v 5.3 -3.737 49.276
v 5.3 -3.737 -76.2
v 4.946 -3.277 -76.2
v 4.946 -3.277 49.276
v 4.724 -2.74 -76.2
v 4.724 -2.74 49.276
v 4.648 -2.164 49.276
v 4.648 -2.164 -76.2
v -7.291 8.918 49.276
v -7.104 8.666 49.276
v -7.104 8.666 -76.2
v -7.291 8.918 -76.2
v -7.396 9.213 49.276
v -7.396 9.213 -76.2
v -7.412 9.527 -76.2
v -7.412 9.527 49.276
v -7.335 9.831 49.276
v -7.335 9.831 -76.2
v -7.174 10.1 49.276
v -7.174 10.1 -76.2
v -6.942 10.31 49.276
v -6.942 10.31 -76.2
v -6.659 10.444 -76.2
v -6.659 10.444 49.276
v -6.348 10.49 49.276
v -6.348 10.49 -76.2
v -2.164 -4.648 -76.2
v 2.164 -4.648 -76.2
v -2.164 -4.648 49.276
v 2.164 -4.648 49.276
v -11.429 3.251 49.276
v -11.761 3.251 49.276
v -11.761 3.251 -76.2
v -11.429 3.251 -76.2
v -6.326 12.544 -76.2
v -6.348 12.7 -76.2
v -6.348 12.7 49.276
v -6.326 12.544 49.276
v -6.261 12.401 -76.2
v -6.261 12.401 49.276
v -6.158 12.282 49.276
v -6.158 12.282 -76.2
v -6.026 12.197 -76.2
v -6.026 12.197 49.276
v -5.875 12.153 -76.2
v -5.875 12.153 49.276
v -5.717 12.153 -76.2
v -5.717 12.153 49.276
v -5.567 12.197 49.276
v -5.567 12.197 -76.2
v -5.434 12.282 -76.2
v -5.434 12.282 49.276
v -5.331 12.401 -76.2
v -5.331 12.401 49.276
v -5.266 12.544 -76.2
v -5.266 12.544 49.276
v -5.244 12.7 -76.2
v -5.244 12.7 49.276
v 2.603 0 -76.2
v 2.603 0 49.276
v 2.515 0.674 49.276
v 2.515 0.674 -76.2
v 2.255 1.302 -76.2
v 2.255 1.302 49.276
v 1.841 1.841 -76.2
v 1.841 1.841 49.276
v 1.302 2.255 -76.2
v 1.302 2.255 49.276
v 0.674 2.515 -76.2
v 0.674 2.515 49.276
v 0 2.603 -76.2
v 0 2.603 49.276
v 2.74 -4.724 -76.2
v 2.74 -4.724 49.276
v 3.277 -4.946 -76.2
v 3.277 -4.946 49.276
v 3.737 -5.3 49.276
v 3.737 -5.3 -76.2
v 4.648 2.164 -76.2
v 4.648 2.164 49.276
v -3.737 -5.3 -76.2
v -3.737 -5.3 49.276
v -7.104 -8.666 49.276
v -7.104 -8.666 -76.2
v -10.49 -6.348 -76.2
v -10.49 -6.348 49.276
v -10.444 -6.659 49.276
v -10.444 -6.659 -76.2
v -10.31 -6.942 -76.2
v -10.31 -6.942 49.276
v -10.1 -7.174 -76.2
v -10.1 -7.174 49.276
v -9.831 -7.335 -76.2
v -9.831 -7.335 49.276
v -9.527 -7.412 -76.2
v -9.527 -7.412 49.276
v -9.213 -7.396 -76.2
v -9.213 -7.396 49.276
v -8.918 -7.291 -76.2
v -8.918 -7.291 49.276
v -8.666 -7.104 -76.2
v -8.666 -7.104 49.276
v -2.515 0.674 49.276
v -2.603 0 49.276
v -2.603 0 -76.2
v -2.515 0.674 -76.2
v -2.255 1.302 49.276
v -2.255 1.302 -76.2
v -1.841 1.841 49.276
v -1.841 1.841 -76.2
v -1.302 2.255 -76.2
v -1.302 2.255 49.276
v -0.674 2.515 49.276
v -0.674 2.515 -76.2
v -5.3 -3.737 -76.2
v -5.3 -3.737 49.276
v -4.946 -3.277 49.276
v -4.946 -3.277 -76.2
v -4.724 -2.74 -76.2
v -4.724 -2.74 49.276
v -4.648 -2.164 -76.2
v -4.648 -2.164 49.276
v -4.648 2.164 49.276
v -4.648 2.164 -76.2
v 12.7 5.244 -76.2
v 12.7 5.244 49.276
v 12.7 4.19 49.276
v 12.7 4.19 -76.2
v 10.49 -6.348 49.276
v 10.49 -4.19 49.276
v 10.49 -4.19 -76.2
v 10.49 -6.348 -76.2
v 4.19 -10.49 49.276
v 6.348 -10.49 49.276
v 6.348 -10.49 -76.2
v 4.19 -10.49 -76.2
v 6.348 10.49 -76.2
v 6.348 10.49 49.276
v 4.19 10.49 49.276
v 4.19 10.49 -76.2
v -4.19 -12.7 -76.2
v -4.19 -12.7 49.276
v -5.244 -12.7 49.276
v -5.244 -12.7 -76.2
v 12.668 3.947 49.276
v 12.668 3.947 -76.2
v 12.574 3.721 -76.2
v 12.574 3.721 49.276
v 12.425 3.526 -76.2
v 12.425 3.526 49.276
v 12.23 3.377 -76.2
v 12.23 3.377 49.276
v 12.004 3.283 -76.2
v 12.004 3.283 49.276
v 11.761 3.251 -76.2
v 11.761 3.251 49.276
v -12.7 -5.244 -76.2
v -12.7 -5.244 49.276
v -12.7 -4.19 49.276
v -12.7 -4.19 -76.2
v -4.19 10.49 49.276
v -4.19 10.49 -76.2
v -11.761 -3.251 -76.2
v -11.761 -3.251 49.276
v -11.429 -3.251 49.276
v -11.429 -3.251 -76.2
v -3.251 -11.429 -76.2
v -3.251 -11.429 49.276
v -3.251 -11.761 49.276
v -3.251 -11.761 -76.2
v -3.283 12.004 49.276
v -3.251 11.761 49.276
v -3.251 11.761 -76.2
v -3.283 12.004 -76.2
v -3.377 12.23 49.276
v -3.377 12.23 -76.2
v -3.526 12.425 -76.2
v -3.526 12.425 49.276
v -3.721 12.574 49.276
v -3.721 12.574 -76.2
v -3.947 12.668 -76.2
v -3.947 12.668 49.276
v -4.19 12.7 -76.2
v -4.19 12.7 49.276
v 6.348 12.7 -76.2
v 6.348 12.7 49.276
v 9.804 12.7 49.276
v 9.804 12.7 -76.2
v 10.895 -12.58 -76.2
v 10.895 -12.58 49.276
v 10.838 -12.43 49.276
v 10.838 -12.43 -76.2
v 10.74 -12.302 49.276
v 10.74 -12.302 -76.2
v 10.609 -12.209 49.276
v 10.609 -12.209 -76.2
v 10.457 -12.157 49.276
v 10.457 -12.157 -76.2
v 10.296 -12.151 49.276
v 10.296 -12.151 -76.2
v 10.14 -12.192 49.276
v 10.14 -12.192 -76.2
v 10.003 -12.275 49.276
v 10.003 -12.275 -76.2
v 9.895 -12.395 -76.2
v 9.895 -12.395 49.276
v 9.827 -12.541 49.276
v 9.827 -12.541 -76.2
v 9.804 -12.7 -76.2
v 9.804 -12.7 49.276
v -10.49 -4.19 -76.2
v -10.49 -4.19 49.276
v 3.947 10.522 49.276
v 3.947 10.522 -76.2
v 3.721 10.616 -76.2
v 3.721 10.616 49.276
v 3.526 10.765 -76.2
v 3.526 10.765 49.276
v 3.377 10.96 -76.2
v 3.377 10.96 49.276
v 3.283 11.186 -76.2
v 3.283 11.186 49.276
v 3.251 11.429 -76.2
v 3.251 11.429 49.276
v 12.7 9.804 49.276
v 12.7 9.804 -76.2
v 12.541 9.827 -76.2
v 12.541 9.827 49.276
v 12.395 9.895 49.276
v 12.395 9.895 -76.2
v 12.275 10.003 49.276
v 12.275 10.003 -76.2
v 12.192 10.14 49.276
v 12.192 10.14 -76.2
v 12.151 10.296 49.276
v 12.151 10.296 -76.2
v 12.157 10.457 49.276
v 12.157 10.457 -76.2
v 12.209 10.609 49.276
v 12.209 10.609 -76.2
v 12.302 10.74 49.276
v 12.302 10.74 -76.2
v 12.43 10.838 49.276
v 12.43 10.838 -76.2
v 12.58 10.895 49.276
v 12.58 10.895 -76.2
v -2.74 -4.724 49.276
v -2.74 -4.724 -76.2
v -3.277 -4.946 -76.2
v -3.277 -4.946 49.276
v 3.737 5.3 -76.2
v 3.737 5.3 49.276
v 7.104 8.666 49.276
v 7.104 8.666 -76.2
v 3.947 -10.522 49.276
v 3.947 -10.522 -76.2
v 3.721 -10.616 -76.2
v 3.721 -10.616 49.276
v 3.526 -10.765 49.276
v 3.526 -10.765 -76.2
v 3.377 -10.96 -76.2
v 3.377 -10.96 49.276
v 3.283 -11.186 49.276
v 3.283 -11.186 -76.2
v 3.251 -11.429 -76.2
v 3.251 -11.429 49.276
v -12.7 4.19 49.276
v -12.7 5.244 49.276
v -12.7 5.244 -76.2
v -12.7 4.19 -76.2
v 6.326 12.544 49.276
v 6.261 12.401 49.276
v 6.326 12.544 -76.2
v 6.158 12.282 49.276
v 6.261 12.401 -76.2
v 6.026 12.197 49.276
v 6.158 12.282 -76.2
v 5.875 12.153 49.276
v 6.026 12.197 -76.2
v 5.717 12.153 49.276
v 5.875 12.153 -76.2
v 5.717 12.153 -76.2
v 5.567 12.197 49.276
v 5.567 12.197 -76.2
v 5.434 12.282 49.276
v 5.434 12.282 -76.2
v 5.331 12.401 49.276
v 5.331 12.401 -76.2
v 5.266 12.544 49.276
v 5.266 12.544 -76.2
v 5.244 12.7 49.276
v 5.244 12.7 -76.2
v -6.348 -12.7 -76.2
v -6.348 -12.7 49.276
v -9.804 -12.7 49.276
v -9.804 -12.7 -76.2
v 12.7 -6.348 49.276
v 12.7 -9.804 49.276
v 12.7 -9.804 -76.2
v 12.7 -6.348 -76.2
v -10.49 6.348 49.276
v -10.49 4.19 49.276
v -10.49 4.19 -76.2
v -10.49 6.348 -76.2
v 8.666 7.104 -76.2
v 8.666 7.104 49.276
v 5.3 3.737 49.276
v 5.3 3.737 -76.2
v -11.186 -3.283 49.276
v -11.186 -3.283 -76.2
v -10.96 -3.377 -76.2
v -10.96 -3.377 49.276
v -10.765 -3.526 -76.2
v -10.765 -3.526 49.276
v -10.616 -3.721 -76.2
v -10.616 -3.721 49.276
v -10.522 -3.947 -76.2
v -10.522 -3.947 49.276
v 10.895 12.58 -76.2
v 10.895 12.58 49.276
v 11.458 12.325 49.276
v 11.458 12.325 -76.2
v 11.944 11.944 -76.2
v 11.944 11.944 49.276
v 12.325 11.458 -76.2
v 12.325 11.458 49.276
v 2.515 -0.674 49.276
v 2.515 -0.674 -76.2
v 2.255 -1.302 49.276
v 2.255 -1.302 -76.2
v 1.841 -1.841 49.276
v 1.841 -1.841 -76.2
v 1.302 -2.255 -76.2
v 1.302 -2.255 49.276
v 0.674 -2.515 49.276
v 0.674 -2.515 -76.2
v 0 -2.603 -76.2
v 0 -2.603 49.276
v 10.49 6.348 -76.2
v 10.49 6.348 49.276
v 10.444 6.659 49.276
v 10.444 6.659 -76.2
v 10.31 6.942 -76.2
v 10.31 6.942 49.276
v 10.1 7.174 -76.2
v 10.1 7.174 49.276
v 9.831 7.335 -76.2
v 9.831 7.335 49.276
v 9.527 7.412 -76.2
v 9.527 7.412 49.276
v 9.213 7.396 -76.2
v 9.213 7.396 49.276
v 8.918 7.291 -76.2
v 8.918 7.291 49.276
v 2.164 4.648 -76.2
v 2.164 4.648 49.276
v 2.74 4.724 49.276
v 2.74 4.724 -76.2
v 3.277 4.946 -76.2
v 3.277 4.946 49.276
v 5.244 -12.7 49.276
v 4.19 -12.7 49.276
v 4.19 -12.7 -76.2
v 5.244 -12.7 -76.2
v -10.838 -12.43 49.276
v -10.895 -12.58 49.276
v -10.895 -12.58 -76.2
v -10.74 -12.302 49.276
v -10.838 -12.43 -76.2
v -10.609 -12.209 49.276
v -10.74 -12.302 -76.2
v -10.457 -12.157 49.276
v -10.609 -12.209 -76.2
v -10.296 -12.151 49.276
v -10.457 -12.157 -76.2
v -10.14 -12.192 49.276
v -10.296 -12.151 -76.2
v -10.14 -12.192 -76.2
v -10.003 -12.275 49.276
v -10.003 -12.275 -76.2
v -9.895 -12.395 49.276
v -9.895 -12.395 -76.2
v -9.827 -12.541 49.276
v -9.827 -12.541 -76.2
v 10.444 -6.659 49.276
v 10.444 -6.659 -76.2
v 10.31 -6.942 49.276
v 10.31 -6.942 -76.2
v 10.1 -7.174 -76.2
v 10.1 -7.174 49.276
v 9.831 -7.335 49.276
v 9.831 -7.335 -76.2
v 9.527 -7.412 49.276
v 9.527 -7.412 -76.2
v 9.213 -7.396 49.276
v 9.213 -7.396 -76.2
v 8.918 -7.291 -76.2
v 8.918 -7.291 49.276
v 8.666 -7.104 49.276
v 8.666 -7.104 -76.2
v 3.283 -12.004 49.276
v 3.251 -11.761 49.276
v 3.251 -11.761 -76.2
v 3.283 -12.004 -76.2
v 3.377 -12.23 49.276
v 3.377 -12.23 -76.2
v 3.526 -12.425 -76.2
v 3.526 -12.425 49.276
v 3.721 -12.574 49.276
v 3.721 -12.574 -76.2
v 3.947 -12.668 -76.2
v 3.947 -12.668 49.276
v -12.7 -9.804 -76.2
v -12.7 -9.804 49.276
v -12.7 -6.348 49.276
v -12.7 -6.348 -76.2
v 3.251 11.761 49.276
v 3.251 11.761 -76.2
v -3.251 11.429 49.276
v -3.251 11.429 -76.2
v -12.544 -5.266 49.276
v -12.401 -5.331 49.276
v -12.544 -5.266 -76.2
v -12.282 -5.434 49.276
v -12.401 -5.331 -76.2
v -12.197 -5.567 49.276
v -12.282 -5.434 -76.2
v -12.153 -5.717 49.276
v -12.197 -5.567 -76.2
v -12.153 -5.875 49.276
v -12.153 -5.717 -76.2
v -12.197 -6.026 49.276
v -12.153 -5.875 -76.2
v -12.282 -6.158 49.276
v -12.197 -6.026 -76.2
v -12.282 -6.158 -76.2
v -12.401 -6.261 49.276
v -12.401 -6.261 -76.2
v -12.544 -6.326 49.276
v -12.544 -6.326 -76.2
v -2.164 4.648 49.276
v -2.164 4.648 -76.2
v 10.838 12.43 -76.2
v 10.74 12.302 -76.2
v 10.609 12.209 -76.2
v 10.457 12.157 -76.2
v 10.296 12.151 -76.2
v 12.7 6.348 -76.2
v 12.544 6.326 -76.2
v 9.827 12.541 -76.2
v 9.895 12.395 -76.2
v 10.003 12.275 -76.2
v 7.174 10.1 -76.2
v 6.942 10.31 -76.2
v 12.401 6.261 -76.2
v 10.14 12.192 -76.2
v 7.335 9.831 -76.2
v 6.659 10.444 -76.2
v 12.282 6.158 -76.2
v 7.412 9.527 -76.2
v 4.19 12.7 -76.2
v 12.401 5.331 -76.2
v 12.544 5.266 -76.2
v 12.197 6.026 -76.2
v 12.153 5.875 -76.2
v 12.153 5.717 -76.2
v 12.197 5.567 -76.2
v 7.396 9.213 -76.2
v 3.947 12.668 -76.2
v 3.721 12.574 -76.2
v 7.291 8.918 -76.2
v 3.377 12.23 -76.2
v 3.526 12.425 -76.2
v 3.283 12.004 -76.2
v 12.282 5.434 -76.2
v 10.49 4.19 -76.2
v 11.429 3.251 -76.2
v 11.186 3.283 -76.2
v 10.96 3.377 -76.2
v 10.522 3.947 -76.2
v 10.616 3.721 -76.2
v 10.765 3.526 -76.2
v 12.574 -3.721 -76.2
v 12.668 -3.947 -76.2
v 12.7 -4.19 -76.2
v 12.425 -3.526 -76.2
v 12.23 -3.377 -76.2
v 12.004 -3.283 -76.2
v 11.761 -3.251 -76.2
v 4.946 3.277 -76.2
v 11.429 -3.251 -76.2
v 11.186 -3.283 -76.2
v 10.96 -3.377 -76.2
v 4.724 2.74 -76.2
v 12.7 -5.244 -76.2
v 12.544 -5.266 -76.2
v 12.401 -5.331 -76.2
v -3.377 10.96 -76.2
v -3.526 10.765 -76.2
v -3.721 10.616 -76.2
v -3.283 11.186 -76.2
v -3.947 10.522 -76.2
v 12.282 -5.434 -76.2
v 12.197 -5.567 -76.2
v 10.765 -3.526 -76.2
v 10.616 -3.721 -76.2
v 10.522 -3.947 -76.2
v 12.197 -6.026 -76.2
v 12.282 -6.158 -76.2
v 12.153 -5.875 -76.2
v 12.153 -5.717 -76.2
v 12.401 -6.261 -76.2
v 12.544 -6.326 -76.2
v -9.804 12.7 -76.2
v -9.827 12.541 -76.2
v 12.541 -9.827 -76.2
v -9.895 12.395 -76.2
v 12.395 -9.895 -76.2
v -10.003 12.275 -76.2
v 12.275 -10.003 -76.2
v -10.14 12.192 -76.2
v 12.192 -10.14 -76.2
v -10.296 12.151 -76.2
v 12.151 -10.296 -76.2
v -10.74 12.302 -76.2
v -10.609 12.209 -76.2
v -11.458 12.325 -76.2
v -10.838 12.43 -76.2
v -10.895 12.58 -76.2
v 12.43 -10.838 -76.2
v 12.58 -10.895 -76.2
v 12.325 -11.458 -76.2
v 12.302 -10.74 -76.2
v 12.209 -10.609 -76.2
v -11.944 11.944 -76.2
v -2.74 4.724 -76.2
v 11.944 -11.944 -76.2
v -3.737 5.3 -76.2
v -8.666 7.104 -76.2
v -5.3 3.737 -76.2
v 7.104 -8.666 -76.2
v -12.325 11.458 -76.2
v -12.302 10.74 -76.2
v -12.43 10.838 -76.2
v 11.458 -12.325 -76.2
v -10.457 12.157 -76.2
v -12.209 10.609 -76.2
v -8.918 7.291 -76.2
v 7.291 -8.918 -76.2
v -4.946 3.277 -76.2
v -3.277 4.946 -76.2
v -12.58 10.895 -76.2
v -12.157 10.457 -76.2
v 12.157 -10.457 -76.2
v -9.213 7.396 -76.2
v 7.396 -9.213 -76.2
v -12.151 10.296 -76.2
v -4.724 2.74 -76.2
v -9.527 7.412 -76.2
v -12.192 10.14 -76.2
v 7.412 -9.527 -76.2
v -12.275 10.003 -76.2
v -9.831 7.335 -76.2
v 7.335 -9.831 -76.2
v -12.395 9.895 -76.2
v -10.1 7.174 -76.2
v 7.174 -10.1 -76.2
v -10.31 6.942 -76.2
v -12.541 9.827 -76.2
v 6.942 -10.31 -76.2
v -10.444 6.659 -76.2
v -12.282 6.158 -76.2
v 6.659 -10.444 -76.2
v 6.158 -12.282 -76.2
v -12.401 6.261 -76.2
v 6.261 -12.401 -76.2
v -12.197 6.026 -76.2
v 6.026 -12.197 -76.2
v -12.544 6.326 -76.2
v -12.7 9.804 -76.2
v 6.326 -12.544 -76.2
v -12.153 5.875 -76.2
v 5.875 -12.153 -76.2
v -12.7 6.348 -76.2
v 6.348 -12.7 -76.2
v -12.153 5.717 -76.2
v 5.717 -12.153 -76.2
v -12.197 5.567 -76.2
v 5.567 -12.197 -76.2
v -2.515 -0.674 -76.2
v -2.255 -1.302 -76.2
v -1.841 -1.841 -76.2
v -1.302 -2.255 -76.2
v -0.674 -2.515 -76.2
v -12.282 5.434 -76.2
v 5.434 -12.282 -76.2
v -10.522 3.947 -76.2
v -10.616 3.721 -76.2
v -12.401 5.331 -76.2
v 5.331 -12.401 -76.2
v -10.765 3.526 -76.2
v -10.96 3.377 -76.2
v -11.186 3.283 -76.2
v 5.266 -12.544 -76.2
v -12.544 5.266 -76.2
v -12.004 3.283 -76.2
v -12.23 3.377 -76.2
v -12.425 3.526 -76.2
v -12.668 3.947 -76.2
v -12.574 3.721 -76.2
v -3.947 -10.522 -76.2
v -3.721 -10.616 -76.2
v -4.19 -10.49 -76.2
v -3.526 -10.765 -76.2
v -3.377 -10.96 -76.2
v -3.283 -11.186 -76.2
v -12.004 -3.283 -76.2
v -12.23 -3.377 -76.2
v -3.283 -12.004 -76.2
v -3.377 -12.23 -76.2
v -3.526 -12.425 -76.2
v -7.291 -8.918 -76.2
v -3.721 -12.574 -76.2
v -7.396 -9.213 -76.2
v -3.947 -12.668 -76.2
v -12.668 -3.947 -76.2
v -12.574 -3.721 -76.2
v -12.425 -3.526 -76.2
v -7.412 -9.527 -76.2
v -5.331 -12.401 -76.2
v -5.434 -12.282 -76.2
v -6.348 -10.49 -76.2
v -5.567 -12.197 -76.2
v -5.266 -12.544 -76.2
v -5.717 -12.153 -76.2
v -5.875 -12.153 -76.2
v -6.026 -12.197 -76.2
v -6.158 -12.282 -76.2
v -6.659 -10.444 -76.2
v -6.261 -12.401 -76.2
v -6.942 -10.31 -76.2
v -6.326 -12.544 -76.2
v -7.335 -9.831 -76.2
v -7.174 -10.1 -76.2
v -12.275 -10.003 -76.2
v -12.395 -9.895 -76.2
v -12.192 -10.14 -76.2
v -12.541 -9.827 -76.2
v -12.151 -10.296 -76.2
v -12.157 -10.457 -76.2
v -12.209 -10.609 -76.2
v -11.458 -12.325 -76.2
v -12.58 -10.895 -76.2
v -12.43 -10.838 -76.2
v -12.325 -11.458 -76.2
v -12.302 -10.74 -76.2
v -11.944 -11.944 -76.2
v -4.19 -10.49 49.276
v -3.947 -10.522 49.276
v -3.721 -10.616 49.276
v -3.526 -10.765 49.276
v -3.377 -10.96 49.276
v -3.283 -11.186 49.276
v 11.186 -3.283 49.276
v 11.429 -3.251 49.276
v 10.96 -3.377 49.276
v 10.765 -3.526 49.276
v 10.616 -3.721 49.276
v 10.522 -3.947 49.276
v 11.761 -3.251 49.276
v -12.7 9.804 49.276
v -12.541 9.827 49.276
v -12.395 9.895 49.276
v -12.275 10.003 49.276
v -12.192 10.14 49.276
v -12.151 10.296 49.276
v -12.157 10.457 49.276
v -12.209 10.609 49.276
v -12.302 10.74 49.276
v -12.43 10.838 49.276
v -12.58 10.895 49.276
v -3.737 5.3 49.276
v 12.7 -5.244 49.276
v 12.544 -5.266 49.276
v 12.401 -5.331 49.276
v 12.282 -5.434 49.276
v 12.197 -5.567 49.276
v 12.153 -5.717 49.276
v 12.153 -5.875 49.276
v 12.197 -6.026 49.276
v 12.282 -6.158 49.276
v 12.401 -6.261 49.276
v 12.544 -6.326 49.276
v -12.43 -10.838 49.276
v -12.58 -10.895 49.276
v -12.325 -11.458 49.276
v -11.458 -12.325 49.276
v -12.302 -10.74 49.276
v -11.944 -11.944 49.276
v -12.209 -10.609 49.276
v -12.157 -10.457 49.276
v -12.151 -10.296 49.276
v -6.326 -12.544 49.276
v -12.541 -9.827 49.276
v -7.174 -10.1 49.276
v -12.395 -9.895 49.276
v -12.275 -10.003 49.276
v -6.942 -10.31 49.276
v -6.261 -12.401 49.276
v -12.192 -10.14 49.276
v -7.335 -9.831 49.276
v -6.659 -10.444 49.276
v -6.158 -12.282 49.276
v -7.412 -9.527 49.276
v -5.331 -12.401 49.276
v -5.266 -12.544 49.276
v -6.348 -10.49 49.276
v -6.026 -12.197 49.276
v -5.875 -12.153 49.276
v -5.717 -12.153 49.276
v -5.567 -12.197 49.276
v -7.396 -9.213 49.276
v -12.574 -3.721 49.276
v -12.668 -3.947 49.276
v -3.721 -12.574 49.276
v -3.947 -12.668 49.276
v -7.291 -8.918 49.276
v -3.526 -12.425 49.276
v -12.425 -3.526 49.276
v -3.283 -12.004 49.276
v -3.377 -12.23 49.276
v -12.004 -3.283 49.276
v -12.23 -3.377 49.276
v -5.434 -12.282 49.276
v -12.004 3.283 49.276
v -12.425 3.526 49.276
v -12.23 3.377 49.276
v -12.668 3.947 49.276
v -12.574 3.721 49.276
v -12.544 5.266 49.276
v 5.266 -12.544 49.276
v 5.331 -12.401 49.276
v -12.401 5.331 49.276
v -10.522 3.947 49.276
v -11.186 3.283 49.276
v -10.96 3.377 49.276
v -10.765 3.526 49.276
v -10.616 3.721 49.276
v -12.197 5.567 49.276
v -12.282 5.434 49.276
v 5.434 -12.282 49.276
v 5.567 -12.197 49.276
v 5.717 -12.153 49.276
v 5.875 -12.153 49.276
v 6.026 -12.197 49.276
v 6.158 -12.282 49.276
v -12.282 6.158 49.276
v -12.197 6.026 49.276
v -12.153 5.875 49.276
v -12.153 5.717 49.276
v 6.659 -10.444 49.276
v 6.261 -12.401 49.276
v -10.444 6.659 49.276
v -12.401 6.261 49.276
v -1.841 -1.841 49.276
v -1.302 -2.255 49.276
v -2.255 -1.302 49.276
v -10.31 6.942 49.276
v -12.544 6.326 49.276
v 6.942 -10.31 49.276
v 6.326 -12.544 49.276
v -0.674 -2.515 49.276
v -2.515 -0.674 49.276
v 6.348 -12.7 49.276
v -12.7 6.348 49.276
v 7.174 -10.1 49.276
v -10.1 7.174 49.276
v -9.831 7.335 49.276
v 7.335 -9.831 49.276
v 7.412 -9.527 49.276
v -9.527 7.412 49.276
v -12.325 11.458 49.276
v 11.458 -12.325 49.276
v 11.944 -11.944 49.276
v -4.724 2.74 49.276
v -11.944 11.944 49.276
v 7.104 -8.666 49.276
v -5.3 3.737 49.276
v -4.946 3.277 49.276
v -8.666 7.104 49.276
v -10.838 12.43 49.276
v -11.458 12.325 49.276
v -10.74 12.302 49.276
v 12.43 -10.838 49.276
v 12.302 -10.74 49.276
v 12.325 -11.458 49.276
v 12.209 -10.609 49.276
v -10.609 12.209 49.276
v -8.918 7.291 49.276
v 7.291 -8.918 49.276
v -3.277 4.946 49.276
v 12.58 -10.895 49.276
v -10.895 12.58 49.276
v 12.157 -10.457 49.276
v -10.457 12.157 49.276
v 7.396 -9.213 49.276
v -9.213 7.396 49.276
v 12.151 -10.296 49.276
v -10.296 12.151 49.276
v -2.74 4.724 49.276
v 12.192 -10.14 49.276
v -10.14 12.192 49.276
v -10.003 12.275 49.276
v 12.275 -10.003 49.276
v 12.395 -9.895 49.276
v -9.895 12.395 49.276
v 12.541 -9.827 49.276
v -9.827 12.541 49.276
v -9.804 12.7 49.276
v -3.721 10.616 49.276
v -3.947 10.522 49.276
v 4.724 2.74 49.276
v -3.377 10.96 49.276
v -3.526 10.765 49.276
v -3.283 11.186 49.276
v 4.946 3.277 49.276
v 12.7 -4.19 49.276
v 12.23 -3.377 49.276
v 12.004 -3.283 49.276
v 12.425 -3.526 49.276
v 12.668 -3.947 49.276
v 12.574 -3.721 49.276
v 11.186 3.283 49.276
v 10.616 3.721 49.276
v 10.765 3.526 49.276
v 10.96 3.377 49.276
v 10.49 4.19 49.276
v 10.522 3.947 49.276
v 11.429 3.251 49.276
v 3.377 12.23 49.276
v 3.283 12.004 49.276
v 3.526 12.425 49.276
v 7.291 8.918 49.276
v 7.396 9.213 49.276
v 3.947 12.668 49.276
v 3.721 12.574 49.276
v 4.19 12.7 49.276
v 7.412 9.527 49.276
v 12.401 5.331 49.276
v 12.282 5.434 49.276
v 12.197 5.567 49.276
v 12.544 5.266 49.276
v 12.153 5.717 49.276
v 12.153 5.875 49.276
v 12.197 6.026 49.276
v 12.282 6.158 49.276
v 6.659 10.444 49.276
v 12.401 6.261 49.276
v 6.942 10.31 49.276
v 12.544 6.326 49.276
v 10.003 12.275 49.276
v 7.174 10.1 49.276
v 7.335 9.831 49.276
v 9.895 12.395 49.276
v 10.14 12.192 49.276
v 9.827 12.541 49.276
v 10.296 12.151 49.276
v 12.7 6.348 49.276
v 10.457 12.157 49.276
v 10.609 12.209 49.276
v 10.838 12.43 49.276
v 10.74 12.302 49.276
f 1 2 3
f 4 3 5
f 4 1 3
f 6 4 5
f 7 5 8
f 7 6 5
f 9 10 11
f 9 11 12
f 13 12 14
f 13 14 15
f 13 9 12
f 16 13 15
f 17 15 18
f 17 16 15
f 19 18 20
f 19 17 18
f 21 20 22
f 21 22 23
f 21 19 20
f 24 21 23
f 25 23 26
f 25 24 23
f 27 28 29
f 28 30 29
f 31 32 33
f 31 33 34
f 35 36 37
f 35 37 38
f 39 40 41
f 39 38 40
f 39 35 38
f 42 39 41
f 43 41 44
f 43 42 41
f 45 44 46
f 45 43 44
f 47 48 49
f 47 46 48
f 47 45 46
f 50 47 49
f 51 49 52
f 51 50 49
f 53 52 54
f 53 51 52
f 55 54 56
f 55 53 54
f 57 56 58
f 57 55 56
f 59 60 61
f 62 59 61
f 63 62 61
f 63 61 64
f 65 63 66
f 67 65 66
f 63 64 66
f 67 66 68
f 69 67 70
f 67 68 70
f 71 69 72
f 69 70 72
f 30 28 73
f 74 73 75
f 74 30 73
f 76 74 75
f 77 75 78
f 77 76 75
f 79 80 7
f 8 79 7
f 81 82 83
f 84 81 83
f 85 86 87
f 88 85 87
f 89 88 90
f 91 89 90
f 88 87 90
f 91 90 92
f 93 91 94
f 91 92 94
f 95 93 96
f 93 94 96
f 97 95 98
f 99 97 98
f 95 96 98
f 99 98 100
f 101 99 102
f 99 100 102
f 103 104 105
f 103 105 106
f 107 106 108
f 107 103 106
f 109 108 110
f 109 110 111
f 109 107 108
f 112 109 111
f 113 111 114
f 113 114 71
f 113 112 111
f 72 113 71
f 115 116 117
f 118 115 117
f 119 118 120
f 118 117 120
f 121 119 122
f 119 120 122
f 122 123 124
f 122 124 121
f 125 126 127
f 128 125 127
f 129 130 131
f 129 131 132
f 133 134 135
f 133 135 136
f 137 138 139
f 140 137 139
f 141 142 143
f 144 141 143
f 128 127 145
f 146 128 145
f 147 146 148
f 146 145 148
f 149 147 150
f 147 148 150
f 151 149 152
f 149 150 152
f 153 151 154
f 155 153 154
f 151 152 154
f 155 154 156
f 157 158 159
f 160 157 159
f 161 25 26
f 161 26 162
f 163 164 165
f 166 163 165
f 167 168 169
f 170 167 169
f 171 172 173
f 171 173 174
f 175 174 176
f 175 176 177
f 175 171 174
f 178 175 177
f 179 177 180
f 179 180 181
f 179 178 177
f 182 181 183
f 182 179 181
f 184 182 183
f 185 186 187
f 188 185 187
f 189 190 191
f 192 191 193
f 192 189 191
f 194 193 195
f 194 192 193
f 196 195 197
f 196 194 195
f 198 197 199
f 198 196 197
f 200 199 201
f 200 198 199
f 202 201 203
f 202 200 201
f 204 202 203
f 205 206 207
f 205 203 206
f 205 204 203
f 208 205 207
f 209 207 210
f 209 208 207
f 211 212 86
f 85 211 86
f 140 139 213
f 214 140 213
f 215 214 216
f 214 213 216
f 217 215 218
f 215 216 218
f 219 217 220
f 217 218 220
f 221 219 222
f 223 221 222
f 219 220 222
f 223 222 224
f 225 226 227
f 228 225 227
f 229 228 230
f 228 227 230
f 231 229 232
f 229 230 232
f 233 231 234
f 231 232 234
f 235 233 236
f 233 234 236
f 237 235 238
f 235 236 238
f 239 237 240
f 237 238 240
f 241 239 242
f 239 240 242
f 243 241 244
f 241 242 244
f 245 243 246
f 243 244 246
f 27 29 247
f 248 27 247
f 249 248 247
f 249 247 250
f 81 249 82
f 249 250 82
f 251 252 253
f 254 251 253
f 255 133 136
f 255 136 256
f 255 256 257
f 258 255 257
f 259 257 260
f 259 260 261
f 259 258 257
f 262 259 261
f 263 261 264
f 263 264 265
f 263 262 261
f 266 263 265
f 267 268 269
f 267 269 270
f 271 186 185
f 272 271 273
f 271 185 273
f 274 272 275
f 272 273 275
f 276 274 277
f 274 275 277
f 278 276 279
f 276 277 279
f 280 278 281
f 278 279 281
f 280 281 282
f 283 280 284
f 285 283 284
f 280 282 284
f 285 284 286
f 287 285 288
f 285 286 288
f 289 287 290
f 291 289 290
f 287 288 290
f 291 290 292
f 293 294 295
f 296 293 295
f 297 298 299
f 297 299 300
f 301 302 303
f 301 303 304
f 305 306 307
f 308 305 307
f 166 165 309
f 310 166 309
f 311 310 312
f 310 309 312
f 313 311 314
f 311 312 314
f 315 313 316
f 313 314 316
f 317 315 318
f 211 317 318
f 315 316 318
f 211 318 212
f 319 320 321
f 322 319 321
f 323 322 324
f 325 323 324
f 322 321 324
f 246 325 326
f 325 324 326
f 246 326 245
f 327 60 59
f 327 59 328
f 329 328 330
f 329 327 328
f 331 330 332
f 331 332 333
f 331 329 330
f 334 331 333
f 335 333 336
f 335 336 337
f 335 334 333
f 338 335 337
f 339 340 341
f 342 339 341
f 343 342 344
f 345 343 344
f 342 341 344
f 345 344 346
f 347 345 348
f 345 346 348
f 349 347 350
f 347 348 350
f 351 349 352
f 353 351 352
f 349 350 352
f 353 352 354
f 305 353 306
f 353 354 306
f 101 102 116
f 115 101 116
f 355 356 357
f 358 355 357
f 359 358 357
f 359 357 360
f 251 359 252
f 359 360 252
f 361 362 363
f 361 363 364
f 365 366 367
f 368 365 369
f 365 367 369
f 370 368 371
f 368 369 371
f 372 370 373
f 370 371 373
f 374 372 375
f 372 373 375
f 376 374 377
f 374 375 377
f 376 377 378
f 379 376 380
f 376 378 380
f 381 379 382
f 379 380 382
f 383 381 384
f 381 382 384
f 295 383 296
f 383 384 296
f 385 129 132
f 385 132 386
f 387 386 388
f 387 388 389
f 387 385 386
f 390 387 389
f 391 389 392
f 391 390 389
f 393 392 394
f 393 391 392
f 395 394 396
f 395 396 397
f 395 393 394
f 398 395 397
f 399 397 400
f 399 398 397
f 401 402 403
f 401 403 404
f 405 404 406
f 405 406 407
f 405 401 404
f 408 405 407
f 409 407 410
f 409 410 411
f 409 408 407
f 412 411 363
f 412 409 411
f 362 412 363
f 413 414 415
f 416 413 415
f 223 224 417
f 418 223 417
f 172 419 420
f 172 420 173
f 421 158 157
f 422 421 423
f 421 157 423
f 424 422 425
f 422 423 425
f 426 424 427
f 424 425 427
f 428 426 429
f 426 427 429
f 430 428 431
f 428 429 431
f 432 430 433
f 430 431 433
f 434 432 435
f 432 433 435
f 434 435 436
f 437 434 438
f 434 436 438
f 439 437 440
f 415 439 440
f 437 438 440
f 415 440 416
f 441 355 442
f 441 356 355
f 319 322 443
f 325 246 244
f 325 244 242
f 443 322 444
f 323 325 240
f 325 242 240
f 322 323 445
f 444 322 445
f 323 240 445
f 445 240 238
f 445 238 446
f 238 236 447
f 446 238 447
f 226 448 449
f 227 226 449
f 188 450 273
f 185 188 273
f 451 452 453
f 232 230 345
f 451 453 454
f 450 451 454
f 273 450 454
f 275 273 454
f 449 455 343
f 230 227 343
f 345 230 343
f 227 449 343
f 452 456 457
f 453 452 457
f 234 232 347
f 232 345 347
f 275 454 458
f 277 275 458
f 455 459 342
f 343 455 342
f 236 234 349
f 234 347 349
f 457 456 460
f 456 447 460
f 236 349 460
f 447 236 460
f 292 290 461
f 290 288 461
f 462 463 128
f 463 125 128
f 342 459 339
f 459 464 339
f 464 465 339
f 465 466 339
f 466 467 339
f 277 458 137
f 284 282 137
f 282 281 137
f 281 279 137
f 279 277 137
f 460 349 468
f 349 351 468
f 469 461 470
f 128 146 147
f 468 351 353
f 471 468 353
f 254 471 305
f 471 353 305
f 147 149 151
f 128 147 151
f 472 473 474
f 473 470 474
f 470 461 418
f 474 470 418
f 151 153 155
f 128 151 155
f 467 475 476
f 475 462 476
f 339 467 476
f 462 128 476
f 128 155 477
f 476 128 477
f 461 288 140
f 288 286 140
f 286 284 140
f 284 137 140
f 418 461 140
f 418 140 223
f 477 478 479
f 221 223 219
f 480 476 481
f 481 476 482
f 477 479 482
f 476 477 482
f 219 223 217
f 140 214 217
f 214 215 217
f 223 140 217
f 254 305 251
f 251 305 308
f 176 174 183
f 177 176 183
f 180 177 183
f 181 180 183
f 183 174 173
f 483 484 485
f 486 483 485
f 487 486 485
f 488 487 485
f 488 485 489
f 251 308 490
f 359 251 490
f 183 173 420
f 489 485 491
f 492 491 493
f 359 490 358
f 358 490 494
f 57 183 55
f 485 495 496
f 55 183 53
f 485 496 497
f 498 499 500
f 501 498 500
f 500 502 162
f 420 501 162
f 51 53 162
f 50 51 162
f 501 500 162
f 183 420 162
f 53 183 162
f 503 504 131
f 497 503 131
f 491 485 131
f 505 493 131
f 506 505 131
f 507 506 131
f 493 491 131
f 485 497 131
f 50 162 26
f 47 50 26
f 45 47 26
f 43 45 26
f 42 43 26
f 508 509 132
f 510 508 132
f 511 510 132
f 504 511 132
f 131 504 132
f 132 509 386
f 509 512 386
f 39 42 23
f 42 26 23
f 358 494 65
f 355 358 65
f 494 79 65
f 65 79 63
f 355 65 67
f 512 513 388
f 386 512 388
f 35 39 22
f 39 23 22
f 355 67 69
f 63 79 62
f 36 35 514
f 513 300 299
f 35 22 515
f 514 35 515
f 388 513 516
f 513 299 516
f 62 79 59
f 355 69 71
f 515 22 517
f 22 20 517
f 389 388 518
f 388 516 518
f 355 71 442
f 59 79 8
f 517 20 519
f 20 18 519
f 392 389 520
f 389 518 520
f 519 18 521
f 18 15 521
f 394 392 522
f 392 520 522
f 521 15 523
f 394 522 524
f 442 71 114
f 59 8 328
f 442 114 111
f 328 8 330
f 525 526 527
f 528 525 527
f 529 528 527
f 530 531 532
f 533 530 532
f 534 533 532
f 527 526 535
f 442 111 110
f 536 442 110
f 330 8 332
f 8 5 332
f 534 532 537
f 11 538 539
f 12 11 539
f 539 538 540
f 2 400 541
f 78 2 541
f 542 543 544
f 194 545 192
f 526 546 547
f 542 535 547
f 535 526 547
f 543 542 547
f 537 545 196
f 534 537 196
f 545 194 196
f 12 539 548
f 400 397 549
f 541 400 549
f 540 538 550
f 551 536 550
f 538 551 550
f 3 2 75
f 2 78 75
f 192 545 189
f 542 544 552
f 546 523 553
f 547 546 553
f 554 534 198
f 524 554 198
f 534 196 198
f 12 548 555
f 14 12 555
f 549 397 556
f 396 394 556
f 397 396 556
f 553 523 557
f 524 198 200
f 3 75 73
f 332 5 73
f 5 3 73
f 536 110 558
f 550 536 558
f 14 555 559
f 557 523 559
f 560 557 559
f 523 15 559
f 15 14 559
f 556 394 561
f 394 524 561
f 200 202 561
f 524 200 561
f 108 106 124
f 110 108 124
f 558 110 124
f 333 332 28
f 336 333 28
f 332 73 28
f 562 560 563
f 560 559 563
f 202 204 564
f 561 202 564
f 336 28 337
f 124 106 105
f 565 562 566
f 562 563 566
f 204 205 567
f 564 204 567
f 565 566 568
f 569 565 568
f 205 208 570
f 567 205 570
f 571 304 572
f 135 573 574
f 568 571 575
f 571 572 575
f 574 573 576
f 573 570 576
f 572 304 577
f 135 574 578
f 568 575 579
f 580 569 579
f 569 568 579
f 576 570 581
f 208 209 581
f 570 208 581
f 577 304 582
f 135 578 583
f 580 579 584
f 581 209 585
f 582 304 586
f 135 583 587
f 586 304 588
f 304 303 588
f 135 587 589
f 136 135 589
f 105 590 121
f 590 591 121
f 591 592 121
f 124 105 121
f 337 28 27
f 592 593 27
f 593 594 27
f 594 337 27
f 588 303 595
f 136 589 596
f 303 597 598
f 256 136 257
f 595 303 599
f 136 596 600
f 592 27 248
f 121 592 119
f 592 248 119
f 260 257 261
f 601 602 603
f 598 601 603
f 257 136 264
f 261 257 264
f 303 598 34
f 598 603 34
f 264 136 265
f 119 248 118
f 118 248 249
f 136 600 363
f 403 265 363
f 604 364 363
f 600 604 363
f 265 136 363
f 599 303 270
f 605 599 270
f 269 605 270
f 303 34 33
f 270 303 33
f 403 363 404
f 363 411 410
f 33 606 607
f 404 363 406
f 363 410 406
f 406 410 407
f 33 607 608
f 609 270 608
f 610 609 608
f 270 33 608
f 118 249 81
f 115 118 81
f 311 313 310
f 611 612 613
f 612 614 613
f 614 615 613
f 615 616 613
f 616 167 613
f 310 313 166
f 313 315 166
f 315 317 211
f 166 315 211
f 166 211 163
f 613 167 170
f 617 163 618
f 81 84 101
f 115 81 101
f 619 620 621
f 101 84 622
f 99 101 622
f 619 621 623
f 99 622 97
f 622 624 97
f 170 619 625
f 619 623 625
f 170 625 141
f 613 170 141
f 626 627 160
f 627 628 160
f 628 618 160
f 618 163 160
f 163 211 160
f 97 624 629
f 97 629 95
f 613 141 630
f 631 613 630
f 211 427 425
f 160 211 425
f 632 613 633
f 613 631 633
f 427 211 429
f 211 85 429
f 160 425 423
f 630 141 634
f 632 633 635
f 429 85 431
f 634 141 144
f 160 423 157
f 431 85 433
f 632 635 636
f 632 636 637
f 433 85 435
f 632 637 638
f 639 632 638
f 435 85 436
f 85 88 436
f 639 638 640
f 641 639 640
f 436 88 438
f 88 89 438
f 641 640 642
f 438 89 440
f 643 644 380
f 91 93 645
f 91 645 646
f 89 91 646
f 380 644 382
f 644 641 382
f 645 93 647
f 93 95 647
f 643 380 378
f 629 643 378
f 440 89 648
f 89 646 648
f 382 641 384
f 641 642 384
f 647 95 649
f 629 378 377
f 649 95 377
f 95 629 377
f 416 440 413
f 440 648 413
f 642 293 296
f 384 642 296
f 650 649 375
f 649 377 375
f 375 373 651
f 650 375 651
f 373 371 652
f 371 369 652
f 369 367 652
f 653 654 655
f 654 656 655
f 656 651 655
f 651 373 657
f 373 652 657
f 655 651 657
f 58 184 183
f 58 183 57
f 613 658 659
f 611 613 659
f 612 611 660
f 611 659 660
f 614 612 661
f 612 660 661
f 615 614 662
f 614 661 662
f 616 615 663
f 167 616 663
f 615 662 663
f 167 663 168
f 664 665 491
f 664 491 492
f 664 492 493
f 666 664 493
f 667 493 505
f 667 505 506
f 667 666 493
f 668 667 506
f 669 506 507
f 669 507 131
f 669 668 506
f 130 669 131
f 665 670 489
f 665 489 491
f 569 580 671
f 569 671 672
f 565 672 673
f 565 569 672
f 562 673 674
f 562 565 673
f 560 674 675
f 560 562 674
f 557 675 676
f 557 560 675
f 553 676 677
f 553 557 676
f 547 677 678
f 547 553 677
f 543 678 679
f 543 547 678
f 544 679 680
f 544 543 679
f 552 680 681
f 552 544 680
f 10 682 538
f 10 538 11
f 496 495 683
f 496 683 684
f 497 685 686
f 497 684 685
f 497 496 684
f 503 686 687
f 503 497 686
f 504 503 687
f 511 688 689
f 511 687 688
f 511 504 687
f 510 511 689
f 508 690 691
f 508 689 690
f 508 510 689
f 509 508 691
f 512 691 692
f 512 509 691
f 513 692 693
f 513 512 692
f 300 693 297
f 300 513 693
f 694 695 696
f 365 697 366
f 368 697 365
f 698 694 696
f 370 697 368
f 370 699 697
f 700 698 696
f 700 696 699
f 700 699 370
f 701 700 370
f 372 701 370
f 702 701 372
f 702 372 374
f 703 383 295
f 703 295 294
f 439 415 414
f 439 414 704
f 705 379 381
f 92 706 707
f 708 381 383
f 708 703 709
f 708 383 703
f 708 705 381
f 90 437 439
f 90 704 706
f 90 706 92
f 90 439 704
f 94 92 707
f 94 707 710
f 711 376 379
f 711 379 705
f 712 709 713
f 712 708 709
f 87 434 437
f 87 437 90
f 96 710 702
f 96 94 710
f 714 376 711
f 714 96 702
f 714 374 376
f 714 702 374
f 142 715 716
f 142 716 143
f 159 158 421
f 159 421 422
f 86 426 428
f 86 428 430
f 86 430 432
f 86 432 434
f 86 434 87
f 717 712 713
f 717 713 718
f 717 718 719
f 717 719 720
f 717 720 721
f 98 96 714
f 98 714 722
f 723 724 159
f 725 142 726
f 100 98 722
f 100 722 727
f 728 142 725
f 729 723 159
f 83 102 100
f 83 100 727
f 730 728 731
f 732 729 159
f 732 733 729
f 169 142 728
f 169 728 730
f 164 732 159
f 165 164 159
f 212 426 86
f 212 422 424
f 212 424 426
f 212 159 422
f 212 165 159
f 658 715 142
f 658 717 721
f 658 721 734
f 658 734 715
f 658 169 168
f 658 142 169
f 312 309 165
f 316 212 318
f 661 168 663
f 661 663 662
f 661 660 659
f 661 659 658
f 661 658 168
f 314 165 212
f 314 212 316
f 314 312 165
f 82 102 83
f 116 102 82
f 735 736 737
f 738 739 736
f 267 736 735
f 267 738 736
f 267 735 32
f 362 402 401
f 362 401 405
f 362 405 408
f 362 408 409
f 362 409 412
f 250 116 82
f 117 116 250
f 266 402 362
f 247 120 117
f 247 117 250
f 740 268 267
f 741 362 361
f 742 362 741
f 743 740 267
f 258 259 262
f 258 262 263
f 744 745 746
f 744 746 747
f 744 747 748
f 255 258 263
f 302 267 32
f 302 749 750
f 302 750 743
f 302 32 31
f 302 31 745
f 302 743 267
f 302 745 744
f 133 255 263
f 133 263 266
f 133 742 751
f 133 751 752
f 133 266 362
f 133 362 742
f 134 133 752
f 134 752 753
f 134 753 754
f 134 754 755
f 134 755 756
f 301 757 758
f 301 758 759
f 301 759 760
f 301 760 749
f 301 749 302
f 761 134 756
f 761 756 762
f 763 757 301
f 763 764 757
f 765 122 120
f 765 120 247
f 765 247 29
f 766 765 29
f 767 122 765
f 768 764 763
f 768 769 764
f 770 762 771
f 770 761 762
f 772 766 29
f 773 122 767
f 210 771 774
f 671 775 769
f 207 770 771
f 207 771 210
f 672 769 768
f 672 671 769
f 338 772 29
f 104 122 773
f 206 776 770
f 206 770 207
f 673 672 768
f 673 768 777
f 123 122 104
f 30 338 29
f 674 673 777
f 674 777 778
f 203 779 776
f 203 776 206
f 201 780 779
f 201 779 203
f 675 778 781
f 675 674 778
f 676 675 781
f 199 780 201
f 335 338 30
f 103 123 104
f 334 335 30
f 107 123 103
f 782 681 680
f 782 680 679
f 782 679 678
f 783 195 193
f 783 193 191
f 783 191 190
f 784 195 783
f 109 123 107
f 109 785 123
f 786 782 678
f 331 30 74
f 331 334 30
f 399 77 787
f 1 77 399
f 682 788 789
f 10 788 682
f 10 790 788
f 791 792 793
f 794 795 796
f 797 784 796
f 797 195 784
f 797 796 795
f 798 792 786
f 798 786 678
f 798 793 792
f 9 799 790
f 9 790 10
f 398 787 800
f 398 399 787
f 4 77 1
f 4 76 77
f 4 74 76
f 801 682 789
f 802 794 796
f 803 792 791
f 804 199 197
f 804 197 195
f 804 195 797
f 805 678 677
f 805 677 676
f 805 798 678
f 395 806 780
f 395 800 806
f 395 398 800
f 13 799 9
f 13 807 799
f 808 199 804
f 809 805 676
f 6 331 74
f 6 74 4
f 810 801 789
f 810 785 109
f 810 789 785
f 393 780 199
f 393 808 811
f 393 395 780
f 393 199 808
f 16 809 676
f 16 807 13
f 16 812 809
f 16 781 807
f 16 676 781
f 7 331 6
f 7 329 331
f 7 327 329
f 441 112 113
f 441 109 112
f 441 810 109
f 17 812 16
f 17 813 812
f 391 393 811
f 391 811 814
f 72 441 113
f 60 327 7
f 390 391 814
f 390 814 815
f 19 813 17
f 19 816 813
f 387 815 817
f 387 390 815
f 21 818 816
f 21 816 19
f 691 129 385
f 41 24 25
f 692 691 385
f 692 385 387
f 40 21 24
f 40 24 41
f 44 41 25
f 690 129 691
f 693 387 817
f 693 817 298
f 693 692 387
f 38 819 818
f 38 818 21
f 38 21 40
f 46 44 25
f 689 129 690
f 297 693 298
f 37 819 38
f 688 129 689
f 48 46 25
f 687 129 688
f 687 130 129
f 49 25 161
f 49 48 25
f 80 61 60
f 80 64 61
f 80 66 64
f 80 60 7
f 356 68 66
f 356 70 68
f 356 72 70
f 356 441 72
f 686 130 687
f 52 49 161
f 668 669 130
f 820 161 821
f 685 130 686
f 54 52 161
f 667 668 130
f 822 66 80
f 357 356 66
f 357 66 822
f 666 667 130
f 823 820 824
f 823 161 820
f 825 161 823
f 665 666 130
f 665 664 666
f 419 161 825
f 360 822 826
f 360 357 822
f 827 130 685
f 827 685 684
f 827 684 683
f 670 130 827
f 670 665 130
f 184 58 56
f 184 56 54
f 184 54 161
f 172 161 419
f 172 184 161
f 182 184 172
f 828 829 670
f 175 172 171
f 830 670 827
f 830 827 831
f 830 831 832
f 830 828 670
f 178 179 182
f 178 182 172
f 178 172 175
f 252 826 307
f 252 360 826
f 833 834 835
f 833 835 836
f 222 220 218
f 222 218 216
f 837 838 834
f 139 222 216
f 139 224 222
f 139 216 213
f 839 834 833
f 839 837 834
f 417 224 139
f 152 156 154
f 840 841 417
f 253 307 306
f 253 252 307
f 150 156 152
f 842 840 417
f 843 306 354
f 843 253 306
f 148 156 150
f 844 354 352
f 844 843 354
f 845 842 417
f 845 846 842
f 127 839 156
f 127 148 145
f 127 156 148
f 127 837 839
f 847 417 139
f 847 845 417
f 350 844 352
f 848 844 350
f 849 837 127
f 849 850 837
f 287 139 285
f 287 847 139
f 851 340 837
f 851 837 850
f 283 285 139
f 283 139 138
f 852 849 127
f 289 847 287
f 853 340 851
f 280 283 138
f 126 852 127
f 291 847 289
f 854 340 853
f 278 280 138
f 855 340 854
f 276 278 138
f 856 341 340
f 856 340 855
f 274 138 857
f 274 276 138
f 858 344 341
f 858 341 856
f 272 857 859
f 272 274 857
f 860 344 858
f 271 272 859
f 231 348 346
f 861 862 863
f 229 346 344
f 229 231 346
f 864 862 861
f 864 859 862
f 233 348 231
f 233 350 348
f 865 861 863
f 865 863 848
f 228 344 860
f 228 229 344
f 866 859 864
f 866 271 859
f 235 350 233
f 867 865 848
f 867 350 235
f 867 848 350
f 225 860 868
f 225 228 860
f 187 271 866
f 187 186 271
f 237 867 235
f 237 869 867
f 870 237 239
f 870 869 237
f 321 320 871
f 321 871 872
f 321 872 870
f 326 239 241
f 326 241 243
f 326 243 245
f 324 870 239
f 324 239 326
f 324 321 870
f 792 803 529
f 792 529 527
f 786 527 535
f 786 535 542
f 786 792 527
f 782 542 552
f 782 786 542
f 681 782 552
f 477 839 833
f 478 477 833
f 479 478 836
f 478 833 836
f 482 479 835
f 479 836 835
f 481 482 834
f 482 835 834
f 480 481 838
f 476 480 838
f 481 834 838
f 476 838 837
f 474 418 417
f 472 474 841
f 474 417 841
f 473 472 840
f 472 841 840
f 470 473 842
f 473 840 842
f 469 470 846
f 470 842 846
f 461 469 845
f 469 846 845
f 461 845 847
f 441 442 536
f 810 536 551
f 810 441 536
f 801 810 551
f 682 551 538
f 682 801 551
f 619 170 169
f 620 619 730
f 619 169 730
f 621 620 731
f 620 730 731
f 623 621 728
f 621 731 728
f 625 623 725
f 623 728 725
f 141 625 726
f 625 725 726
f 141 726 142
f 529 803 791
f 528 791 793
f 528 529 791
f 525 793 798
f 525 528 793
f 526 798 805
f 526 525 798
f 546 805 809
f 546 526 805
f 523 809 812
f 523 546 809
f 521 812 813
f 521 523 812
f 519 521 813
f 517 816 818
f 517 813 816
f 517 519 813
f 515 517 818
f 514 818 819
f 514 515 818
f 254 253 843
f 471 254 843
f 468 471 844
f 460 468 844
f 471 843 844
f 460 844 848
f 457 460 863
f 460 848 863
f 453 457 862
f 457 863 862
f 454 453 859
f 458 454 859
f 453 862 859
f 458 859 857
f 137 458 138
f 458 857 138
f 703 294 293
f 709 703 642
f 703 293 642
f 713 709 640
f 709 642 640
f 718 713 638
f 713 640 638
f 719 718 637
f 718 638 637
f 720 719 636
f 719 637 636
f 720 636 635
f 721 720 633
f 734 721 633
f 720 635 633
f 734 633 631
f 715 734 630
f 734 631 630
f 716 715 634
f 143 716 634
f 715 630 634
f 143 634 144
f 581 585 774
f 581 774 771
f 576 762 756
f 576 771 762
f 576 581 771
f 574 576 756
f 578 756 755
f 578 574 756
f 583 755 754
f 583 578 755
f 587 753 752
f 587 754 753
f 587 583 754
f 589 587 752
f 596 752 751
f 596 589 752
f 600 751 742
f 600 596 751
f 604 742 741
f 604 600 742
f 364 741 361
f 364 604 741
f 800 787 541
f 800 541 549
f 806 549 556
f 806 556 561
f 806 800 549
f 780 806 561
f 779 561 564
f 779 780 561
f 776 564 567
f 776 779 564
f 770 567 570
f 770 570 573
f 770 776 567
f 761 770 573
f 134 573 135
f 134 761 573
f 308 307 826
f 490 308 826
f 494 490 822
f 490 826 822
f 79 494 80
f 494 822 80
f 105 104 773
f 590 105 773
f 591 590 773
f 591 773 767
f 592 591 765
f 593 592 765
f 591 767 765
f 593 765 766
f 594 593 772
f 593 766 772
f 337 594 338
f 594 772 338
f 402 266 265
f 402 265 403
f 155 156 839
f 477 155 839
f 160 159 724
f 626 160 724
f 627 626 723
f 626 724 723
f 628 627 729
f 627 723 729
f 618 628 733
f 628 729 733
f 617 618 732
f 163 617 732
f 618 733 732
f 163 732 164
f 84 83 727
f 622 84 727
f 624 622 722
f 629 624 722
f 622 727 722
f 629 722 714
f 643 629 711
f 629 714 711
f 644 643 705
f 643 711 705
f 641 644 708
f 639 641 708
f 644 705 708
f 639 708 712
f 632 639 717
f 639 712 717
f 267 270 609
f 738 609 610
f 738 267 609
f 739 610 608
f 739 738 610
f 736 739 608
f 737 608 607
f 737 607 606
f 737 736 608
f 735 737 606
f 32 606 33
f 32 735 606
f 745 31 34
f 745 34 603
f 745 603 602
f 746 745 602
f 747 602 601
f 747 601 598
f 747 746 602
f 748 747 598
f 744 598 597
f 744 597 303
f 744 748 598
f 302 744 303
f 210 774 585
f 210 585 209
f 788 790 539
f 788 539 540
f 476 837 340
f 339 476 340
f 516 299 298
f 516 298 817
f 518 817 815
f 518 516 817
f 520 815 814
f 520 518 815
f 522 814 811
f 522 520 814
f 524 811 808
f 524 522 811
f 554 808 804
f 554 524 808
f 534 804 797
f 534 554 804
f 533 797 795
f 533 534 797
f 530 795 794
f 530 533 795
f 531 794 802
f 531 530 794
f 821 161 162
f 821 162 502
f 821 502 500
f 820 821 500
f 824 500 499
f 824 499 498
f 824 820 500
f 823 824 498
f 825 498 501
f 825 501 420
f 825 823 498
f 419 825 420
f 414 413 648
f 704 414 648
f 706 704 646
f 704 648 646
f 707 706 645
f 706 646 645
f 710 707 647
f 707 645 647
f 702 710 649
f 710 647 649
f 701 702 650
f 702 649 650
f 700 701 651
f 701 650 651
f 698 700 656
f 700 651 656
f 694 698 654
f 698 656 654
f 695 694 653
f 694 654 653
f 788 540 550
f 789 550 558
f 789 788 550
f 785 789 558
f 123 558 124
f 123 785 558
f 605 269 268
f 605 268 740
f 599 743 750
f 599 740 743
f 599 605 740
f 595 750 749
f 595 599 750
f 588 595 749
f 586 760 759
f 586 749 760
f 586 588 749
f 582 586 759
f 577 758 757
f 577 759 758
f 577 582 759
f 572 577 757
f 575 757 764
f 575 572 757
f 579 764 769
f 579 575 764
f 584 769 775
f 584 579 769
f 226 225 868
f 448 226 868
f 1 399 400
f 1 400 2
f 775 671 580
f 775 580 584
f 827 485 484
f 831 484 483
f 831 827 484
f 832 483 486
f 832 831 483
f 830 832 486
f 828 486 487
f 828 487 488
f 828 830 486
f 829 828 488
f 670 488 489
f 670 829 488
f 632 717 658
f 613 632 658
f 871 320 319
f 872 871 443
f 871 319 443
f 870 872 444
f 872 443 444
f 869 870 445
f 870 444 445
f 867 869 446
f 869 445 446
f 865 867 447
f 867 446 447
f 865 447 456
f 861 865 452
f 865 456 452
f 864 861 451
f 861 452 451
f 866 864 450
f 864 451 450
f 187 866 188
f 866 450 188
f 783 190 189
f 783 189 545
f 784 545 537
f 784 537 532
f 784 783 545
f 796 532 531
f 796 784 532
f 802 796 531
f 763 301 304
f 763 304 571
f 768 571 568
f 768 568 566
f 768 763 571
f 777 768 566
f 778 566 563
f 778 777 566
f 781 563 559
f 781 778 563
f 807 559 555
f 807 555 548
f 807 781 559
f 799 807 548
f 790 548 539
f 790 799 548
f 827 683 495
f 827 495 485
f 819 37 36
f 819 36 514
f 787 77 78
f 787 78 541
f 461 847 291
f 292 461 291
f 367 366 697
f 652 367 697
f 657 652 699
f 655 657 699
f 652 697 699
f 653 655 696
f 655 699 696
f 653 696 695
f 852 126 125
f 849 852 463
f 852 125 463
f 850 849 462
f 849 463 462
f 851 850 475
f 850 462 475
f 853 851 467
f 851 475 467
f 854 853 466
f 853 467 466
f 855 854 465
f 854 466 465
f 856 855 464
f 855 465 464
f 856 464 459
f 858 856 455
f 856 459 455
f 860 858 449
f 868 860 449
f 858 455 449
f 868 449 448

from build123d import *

# Parameters (mm, degrees)
BOSS_EXTRUDE1_DEPTH     = 76.2
CUT_EXTRUDE1_DEPTH      = 79.288057838
CUT_EXTRUDE1_DEPTH_BACK = 79.288057838
SKETCH5_R               = 0.55245
SKETCH6_W               = 30.48
SKETCH6_H               = 30.48
CUT_EXTRUDE2_DEPTH      = 26.924


with BuildPart() as part:
    # Sketch4 → Boss-Extrude1 (new, symmetric)
    with BuildSketch(Plane.XY):
        with BuildLine():
            Line((4.190365, -12.7), (10.11729625, -12.7))
            ThreePointArc((10.11729625, -12.7), (11.943543585, -11.943543585), (12.7, -10.11729625))
            Line((12.7, -10.11729625), (12.7, -4.190365))
            ThreePointArc((12.7, -4.190365), (12.42492494, -3.52627506), (11.760835, -3.2512))
            Line((11.760835, -3.2512), (11.429365, -3.2512))
            ThreePointArc((11.429365, -3.2512), (10.76527506, -3.52627506), (10.4902, -4.190365))
            Line((10.4902, -4.190365), (10.4902, -6.348478019))
            ThreePointArc((10.4902, -6.348478019), (9.830707141, -7.335478831), (8.666460301, -7.103895736))
            Line((8.666460301, -7.103895736), (5.299899128, -3.737334563))
            ThreePointArc((5.299899128, -3.737334563), (4.817571085, -3.015479634), (4.6482, -2.16399369))
            Line((4.6482, -2.16399369), (4.6482, 0))
            Line((4.6482, 0), (2.6035, 0))
            ThreePointArc((2.6035, 0), (1.840952505, -1.840952505), (0, -2.6035))
            Line((0, -2.6035), (0, -4.6482))
            Line((0, -4.6482), (2.16399369, -4.6482))
            ThreePointArc((2.16399369, -4.6482), (3.015479634, -4.817571085), (3.737334563, -5.299899128))
            Line((3.737334563, -5.299899128), (7.103895736, -8.666460301))
            ThreePointArc((7.103895736, -8.666460301), (7.335478831, -9.830707141), (6.348478019, -10.4902))
            Line((6.348478019, -10.4902), (4.190365, -10.4902))
            ThreePointArc((4.190365, -10.4902), (3.52627506, -10.76527506), (3.2512, -11.429365))
            Line((3.2512, -11.429365), (3.2512, -11.760835))
            ThreePointArc((3.2512, -11.760835), (3.52627506, -12.42492494), (4.190365, -12.7))
        make_face()
    extrude(amount=BOSS_EXTRUDE1_DEPTH, both=True)

    # Sketch5 → Cut-Extrude1 (cut, two sides: drawn at the far end of the back side and taken through both)
    with BuildSketch(Plane.XY.offset(-CUT_EXTRUDE1_DEPTH_BACK)):
        with Locations((10.356153152, -12.7)):
            Circle(SKETCH5_R)
        with Locations((5.796028019, -12.7)):
            Circle(SKETCH5_R)
        with Locations((12.7, -10.356153152)):
            Circle(SKETCH5_R)
        with Locations((12.7, -5.796028019)):
            Circle(SKETCH5_R)
    extrude(amount=CUT_EXTRUDE1_DEPTH + CUT_EXTRUDE1_DEPTH_BACK, mode=Mode.SUBTRACT)

    # Mirror1: part across plane


with BuildPart() as part_1:
    add(part.part)
    add(part.part.mirror(Plane(origin=(0, 0, 0), x_dir=(0, 0, 1), z_dir=(1, 0, 0))))

    # Mirror2: part across plane


with BuildPart() as part_2:
    add(part_1.part)
    add(part_1.part.mirror(Plane.ZX))

    # Sketch6 → Cut-Extrude2 (cut)
    with BuildSketch(Plane.XY.offset(76.2)):
        Rectangle(SKETCH6_W, SKETCH6_H)
    extrude(amount=-CUT_EXTRUDE2_DEPTH, mode=Mode.SUBTRACT)


solid = part_2.part
